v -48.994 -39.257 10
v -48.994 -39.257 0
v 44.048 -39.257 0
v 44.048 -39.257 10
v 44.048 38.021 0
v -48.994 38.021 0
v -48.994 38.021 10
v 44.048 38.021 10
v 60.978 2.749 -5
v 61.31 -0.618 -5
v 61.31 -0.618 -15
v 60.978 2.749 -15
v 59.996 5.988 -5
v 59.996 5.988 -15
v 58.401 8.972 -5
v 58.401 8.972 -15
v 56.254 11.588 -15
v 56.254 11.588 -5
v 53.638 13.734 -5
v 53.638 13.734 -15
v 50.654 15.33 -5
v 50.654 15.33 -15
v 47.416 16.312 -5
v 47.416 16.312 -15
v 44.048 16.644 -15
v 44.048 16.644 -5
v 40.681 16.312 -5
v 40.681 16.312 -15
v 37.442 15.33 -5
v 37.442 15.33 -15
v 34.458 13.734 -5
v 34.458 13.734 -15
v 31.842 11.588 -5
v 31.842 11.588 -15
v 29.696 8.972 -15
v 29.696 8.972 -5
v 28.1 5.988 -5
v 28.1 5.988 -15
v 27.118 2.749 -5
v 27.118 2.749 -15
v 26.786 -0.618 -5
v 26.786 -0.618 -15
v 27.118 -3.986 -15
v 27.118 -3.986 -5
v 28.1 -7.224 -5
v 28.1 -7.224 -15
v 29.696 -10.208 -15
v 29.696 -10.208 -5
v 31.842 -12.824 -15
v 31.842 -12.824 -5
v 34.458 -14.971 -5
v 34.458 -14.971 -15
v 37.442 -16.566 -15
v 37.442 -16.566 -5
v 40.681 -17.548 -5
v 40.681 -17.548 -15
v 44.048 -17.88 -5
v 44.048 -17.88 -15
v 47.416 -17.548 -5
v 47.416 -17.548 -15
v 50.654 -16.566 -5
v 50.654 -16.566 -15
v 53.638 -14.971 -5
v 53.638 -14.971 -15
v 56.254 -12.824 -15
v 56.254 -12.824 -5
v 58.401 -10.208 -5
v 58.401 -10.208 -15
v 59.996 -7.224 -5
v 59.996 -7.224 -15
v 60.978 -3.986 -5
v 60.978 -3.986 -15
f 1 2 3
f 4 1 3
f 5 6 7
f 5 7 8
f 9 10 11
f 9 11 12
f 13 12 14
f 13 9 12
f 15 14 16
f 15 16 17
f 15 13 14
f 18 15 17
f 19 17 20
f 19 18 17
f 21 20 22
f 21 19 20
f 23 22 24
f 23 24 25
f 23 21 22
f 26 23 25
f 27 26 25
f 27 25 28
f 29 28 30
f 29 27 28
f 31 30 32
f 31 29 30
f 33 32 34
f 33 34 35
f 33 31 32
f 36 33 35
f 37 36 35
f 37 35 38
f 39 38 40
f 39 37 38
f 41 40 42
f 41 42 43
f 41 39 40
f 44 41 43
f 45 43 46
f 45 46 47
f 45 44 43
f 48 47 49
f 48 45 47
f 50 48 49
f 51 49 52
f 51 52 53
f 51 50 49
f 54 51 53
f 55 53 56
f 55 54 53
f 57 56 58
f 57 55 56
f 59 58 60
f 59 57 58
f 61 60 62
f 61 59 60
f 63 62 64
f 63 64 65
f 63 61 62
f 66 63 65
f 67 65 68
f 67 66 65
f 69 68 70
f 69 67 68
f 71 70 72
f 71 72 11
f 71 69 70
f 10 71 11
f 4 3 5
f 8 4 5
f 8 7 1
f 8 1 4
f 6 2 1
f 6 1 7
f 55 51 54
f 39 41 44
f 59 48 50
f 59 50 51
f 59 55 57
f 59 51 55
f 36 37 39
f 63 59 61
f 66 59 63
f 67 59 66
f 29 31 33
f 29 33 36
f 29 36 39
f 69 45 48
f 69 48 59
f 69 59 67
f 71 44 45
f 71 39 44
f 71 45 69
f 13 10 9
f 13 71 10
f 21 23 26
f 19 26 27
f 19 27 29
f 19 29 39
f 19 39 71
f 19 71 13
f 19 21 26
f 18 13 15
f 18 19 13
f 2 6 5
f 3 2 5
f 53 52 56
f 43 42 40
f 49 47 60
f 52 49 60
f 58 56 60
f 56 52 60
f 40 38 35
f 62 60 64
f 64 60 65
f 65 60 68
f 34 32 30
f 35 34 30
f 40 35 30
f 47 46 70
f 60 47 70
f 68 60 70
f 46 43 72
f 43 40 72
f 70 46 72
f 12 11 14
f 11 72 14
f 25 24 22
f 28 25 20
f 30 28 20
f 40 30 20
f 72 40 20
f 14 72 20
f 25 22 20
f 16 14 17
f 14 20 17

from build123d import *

# Parameters (mm, degrees)
F_1_FR_W        = 93.042145165
F_1_FR_H        = 77.277529207
EXTRUDE_1_DEPTH = 10
SKETCH_5_R      = 17.261773312
EXTRUDE_2_DEPTH = 10


with BuildPart() as part:
    # Эскиз1_fr → Бобышка-Вытянуть1 (new body)
    with BuildSketch(Plane.XY):
        with Locations((-2.472880935, -0.618220234)):
            Rectangle(F_1_FR_W, F_1_FR_H)
    extrude(amount=EXTRUDE_1_DEPTH)


with BuildPart() as body_2:
    # Эскиз5 → Бобышка-Вытянуть2 (new body)
    with BuildSketch(Plane.XY.offset(-5)):
        with Locations((44.048191648, -0.618220234)):
            Circle(SKETCH_5_R)
    extrude(amount=-EXTRUDE_2_DEPTH)


solid = Compound([part.part, body_2.part])
